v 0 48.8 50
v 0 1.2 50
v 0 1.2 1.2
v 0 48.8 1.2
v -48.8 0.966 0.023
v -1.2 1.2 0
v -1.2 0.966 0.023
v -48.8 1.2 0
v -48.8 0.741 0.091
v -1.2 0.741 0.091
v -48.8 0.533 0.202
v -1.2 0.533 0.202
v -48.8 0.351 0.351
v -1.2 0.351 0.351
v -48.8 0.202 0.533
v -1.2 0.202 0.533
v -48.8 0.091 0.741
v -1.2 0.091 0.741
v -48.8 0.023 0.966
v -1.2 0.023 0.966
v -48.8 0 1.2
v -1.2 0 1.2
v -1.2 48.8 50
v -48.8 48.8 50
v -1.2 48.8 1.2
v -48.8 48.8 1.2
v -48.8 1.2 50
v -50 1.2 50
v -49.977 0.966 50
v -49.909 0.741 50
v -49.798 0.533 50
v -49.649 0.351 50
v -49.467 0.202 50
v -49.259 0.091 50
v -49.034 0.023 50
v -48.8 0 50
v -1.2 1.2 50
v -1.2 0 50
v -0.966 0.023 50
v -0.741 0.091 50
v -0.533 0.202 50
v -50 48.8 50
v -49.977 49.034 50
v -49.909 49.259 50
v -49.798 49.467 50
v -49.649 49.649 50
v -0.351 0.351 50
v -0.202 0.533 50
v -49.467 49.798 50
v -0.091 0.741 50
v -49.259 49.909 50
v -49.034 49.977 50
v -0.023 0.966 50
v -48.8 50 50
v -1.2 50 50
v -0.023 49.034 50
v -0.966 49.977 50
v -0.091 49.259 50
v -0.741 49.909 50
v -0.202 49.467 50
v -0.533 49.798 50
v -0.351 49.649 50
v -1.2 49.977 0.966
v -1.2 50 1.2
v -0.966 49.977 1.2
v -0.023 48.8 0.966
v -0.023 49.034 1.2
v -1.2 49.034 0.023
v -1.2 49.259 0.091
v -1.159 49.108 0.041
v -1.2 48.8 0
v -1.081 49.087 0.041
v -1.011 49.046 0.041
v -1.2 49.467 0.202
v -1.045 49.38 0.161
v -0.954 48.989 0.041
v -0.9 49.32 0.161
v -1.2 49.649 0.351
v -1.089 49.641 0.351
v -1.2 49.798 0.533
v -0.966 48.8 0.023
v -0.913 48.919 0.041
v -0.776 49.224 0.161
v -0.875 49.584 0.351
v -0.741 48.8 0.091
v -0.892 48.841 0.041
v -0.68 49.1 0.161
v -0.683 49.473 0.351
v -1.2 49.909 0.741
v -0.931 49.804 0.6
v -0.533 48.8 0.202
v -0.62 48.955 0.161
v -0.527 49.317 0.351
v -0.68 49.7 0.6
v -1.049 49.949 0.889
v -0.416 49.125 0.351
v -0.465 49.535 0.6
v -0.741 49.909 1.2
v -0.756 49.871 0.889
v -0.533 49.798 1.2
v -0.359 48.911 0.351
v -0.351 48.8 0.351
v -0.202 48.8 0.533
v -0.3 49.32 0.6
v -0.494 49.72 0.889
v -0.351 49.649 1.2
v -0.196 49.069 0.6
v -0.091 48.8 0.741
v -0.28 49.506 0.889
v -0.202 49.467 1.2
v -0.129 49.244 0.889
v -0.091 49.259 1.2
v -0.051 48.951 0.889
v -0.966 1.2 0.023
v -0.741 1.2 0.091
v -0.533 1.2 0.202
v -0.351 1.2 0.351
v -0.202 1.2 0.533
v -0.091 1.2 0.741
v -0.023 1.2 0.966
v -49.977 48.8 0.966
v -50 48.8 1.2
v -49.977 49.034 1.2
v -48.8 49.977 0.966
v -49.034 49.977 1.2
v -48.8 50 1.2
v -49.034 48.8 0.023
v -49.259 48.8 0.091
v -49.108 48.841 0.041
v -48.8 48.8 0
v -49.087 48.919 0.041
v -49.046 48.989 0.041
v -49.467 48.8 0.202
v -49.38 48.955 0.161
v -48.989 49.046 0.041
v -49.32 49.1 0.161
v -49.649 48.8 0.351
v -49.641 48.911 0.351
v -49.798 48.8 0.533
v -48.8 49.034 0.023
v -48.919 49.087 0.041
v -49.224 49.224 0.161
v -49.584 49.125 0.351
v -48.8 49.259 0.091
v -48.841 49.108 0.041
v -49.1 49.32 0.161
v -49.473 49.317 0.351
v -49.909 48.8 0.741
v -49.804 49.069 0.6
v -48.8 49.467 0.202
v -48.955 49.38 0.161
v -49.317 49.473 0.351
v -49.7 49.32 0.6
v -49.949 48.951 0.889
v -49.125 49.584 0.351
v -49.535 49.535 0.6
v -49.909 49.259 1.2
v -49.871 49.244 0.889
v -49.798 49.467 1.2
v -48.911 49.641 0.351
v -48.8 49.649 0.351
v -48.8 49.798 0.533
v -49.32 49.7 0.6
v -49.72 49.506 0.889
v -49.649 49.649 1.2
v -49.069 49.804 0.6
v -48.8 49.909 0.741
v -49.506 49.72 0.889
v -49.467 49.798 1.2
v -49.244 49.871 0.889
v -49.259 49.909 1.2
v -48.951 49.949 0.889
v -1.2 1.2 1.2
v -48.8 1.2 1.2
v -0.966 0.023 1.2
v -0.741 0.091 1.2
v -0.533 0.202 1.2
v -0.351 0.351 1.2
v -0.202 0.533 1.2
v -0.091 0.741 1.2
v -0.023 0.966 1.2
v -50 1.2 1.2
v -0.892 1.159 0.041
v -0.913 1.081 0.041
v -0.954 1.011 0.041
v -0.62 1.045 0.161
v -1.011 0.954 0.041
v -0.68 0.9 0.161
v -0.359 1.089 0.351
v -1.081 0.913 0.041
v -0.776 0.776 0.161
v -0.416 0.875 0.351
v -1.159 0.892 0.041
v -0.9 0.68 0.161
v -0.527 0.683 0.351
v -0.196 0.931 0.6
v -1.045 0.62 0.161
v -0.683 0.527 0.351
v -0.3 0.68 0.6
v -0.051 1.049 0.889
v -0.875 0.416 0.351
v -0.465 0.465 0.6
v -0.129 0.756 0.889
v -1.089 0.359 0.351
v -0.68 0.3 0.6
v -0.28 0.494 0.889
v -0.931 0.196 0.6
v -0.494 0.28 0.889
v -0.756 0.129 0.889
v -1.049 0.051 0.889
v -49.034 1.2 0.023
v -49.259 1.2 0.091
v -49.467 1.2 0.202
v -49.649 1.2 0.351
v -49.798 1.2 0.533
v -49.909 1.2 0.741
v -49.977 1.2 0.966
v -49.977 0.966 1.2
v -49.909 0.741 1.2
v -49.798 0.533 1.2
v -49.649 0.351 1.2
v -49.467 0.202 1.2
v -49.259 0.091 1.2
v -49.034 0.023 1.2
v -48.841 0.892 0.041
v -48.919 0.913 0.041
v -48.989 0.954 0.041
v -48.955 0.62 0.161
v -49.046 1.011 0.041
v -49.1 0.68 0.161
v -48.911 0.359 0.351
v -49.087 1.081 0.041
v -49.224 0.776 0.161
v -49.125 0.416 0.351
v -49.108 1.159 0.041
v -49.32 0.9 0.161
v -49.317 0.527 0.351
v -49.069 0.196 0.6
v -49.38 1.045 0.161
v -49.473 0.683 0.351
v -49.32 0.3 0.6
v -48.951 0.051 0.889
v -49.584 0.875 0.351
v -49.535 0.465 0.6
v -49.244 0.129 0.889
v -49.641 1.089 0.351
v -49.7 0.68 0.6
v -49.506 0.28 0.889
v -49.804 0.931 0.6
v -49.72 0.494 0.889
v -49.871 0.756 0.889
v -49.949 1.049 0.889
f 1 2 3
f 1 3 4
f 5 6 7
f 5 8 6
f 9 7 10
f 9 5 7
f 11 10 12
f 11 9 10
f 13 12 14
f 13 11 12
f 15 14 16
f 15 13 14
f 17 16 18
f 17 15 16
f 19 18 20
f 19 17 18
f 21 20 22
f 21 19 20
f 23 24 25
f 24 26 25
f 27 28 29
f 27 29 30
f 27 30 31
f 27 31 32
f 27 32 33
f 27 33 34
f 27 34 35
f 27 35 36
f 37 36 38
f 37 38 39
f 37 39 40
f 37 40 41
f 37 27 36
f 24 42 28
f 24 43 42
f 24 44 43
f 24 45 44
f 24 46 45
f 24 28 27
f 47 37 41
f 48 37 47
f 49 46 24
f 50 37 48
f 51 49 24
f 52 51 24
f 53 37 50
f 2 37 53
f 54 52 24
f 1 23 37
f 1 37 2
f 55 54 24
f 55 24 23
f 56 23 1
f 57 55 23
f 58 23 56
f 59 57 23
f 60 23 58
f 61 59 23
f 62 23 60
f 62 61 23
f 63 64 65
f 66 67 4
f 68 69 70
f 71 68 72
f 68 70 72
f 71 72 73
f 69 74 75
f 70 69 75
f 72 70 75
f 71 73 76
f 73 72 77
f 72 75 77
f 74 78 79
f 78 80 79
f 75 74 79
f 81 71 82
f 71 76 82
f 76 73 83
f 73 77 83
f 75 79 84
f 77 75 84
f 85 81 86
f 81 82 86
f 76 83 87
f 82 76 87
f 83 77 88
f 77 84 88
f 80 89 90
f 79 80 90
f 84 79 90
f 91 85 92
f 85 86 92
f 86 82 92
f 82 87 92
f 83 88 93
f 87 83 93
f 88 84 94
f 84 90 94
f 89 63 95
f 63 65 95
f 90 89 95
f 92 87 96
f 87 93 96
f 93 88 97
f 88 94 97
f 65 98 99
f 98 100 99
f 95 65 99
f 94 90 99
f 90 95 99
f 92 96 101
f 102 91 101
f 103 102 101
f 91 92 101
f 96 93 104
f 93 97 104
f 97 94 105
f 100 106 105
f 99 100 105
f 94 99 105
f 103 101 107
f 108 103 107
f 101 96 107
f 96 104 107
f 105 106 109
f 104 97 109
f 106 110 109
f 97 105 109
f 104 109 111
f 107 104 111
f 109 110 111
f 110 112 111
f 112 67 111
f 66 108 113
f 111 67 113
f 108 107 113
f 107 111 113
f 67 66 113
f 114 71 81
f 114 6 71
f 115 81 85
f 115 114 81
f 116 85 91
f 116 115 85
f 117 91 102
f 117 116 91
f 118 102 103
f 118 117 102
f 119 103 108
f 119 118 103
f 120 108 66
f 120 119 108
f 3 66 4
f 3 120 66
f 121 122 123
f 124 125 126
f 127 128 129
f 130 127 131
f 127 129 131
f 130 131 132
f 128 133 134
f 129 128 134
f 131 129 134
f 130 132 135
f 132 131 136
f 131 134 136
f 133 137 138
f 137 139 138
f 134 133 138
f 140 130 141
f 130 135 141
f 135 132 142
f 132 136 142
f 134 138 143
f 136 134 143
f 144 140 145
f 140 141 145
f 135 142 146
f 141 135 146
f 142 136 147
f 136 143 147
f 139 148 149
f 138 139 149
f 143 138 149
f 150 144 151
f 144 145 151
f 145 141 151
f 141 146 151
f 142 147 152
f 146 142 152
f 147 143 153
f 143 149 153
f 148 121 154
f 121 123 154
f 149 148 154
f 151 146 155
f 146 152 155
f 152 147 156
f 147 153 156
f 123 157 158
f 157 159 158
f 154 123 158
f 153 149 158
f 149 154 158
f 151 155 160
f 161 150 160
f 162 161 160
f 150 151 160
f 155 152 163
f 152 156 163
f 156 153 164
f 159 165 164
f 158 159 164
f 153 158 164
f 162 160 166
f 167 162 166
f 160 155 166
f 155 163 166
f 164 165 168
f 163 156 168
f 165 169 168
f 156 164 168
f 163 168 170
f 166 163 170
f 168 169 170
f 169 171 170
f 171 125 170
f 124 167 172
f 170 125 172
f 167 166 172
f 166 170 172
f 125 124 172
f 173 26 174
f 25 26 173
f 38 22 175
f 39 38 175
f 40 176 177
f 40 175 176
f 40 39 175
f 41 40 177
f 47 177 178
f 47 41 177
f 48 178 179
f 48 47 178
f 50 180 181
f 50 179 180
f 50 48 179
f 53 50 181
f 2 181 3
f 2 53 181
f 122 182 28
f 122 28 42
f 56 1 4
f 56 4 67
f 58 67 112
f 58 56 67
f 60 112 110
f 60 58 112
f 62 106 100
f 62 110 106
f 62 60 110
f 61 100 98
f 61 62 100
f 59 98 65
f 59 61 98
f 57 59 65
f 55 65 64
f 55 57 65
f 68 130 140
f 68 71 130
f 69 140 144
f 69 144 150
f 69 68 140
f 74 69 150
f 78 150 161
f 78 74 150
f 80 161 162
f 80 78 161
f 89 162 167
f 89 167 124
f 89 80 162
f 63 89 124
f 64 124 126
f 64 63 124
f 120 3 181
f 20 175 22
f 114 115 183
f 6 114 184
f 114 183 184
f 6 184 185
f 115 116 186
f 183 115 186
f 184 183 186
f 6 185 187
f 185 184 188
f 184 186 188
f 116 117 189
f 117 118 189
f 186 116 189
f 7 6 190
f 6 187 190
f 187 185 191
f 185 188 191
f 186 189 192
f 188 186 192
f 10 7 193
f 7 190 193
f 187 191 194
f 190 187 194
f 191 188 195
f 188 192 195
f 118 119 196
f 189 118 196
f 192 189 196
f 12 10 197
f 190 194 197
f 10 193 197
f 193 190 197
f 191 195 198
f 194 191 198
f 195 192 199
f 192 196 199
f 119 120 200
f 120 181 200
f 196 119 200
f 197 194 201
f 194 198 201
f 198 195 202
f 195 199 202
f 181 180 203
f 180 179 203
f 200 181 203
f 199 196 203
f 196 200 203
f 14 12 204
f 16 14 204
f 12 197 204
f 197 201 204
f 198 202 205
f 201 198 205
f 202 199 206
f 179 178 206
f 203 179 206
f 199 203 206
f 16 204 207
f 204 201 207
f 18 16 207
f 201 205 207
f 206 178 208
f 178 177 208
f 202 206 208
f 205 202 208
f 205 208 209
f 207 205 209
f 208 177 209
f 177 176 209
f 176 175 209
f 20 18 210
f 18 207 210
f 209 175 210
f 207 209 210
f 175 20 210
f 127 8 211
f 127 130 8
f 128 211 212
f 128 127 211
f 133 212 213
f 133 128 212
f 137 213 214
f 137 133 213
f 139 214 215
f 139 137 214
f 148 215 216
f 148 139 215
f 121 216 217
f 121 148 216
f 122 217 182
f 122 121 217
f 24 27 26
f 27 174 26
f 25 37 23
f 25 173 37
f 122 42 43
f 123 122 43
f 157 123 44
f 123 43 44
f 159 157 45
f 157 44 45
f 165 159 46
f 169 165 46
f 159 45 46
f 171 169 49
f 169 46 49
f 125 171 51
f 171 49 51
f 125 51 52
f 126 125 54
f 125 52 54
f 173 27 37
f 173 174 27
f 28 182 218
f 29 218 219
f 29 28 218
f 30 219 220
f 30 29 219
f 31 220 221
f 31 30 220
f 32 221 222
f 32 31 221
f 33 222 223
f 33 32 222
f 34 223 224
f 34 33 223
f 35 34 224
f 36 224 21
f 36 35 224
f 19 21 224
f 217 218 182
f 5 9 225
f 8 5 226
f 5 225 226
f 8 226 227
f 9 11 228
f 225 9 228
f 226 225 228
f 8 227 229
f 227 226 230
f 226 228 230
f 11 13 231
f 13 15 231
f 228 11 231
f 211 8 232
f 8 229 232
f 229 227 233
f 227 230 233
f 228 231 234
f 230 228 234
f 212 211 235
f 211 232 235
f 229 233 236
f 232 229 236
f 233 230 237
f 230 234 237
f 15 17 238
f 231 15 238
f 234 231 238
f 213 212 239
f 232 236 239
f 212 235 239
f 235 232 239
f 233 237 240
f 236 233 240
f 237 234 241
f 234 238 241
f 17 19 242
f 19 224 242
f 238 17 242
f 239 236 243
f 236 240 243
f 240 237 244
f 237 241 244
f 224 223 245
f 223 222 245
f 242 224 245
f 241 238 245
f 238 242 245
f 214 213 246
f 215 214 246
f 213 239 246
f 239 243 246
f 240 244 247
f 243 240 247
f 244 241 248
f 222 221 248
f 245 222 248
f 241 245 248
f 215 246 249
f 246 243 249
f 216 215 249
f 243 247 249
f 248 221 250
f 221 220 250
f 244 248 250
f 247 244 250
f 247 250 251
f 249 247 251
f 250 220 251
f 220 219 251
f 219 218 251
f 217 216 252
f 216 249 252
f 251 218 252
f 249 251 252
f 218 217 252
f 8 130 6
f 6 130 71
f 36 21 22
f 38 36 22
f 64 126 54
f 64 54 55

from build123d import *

# Parameters (mm, degrees)
F0_W     = 50
F0_H     = 50
F1_DEPTH = 50
F2_T     = -1.2
F3_R     = 1.2
F4_R     = 1.2


with BuildPart() as f1:
    # F0 (on Top) → F1 (new body)
    with BuildSketch(Plane.XY):
        with Locations((-25, 25)):
            Rectangle(F0_W, F0_H)
    extrude(amount=F1_DEPTH)

    # F2
    f2_openings = [f1.faces().sort_by_distance(p)[0] for p in [
        (-25, 25, 50),
    ]]
    offset(amount=F2_T, openings=f2_openings)

    # F3
    f3_edges = [f1.edges().sort_by_distance(p)[0] for p in [
        (-50, 50, 25),
        (-50, 0, 25),
        (0, 0, 25),
        (0, 50, 25),
    ]]
    fillet(f3_edges, radius=F3_R)

    # F4
    f4_edges = [f1.edges().sort_by_distance(p)[0] for p in [
        (-25, 50, 0),
        (-50, 25, 0),
        (0, 25, 0),
        (-25, 0, 0),
    ]]
    fillet(f4_edges, radius=F4_R)


solid = f1.part
